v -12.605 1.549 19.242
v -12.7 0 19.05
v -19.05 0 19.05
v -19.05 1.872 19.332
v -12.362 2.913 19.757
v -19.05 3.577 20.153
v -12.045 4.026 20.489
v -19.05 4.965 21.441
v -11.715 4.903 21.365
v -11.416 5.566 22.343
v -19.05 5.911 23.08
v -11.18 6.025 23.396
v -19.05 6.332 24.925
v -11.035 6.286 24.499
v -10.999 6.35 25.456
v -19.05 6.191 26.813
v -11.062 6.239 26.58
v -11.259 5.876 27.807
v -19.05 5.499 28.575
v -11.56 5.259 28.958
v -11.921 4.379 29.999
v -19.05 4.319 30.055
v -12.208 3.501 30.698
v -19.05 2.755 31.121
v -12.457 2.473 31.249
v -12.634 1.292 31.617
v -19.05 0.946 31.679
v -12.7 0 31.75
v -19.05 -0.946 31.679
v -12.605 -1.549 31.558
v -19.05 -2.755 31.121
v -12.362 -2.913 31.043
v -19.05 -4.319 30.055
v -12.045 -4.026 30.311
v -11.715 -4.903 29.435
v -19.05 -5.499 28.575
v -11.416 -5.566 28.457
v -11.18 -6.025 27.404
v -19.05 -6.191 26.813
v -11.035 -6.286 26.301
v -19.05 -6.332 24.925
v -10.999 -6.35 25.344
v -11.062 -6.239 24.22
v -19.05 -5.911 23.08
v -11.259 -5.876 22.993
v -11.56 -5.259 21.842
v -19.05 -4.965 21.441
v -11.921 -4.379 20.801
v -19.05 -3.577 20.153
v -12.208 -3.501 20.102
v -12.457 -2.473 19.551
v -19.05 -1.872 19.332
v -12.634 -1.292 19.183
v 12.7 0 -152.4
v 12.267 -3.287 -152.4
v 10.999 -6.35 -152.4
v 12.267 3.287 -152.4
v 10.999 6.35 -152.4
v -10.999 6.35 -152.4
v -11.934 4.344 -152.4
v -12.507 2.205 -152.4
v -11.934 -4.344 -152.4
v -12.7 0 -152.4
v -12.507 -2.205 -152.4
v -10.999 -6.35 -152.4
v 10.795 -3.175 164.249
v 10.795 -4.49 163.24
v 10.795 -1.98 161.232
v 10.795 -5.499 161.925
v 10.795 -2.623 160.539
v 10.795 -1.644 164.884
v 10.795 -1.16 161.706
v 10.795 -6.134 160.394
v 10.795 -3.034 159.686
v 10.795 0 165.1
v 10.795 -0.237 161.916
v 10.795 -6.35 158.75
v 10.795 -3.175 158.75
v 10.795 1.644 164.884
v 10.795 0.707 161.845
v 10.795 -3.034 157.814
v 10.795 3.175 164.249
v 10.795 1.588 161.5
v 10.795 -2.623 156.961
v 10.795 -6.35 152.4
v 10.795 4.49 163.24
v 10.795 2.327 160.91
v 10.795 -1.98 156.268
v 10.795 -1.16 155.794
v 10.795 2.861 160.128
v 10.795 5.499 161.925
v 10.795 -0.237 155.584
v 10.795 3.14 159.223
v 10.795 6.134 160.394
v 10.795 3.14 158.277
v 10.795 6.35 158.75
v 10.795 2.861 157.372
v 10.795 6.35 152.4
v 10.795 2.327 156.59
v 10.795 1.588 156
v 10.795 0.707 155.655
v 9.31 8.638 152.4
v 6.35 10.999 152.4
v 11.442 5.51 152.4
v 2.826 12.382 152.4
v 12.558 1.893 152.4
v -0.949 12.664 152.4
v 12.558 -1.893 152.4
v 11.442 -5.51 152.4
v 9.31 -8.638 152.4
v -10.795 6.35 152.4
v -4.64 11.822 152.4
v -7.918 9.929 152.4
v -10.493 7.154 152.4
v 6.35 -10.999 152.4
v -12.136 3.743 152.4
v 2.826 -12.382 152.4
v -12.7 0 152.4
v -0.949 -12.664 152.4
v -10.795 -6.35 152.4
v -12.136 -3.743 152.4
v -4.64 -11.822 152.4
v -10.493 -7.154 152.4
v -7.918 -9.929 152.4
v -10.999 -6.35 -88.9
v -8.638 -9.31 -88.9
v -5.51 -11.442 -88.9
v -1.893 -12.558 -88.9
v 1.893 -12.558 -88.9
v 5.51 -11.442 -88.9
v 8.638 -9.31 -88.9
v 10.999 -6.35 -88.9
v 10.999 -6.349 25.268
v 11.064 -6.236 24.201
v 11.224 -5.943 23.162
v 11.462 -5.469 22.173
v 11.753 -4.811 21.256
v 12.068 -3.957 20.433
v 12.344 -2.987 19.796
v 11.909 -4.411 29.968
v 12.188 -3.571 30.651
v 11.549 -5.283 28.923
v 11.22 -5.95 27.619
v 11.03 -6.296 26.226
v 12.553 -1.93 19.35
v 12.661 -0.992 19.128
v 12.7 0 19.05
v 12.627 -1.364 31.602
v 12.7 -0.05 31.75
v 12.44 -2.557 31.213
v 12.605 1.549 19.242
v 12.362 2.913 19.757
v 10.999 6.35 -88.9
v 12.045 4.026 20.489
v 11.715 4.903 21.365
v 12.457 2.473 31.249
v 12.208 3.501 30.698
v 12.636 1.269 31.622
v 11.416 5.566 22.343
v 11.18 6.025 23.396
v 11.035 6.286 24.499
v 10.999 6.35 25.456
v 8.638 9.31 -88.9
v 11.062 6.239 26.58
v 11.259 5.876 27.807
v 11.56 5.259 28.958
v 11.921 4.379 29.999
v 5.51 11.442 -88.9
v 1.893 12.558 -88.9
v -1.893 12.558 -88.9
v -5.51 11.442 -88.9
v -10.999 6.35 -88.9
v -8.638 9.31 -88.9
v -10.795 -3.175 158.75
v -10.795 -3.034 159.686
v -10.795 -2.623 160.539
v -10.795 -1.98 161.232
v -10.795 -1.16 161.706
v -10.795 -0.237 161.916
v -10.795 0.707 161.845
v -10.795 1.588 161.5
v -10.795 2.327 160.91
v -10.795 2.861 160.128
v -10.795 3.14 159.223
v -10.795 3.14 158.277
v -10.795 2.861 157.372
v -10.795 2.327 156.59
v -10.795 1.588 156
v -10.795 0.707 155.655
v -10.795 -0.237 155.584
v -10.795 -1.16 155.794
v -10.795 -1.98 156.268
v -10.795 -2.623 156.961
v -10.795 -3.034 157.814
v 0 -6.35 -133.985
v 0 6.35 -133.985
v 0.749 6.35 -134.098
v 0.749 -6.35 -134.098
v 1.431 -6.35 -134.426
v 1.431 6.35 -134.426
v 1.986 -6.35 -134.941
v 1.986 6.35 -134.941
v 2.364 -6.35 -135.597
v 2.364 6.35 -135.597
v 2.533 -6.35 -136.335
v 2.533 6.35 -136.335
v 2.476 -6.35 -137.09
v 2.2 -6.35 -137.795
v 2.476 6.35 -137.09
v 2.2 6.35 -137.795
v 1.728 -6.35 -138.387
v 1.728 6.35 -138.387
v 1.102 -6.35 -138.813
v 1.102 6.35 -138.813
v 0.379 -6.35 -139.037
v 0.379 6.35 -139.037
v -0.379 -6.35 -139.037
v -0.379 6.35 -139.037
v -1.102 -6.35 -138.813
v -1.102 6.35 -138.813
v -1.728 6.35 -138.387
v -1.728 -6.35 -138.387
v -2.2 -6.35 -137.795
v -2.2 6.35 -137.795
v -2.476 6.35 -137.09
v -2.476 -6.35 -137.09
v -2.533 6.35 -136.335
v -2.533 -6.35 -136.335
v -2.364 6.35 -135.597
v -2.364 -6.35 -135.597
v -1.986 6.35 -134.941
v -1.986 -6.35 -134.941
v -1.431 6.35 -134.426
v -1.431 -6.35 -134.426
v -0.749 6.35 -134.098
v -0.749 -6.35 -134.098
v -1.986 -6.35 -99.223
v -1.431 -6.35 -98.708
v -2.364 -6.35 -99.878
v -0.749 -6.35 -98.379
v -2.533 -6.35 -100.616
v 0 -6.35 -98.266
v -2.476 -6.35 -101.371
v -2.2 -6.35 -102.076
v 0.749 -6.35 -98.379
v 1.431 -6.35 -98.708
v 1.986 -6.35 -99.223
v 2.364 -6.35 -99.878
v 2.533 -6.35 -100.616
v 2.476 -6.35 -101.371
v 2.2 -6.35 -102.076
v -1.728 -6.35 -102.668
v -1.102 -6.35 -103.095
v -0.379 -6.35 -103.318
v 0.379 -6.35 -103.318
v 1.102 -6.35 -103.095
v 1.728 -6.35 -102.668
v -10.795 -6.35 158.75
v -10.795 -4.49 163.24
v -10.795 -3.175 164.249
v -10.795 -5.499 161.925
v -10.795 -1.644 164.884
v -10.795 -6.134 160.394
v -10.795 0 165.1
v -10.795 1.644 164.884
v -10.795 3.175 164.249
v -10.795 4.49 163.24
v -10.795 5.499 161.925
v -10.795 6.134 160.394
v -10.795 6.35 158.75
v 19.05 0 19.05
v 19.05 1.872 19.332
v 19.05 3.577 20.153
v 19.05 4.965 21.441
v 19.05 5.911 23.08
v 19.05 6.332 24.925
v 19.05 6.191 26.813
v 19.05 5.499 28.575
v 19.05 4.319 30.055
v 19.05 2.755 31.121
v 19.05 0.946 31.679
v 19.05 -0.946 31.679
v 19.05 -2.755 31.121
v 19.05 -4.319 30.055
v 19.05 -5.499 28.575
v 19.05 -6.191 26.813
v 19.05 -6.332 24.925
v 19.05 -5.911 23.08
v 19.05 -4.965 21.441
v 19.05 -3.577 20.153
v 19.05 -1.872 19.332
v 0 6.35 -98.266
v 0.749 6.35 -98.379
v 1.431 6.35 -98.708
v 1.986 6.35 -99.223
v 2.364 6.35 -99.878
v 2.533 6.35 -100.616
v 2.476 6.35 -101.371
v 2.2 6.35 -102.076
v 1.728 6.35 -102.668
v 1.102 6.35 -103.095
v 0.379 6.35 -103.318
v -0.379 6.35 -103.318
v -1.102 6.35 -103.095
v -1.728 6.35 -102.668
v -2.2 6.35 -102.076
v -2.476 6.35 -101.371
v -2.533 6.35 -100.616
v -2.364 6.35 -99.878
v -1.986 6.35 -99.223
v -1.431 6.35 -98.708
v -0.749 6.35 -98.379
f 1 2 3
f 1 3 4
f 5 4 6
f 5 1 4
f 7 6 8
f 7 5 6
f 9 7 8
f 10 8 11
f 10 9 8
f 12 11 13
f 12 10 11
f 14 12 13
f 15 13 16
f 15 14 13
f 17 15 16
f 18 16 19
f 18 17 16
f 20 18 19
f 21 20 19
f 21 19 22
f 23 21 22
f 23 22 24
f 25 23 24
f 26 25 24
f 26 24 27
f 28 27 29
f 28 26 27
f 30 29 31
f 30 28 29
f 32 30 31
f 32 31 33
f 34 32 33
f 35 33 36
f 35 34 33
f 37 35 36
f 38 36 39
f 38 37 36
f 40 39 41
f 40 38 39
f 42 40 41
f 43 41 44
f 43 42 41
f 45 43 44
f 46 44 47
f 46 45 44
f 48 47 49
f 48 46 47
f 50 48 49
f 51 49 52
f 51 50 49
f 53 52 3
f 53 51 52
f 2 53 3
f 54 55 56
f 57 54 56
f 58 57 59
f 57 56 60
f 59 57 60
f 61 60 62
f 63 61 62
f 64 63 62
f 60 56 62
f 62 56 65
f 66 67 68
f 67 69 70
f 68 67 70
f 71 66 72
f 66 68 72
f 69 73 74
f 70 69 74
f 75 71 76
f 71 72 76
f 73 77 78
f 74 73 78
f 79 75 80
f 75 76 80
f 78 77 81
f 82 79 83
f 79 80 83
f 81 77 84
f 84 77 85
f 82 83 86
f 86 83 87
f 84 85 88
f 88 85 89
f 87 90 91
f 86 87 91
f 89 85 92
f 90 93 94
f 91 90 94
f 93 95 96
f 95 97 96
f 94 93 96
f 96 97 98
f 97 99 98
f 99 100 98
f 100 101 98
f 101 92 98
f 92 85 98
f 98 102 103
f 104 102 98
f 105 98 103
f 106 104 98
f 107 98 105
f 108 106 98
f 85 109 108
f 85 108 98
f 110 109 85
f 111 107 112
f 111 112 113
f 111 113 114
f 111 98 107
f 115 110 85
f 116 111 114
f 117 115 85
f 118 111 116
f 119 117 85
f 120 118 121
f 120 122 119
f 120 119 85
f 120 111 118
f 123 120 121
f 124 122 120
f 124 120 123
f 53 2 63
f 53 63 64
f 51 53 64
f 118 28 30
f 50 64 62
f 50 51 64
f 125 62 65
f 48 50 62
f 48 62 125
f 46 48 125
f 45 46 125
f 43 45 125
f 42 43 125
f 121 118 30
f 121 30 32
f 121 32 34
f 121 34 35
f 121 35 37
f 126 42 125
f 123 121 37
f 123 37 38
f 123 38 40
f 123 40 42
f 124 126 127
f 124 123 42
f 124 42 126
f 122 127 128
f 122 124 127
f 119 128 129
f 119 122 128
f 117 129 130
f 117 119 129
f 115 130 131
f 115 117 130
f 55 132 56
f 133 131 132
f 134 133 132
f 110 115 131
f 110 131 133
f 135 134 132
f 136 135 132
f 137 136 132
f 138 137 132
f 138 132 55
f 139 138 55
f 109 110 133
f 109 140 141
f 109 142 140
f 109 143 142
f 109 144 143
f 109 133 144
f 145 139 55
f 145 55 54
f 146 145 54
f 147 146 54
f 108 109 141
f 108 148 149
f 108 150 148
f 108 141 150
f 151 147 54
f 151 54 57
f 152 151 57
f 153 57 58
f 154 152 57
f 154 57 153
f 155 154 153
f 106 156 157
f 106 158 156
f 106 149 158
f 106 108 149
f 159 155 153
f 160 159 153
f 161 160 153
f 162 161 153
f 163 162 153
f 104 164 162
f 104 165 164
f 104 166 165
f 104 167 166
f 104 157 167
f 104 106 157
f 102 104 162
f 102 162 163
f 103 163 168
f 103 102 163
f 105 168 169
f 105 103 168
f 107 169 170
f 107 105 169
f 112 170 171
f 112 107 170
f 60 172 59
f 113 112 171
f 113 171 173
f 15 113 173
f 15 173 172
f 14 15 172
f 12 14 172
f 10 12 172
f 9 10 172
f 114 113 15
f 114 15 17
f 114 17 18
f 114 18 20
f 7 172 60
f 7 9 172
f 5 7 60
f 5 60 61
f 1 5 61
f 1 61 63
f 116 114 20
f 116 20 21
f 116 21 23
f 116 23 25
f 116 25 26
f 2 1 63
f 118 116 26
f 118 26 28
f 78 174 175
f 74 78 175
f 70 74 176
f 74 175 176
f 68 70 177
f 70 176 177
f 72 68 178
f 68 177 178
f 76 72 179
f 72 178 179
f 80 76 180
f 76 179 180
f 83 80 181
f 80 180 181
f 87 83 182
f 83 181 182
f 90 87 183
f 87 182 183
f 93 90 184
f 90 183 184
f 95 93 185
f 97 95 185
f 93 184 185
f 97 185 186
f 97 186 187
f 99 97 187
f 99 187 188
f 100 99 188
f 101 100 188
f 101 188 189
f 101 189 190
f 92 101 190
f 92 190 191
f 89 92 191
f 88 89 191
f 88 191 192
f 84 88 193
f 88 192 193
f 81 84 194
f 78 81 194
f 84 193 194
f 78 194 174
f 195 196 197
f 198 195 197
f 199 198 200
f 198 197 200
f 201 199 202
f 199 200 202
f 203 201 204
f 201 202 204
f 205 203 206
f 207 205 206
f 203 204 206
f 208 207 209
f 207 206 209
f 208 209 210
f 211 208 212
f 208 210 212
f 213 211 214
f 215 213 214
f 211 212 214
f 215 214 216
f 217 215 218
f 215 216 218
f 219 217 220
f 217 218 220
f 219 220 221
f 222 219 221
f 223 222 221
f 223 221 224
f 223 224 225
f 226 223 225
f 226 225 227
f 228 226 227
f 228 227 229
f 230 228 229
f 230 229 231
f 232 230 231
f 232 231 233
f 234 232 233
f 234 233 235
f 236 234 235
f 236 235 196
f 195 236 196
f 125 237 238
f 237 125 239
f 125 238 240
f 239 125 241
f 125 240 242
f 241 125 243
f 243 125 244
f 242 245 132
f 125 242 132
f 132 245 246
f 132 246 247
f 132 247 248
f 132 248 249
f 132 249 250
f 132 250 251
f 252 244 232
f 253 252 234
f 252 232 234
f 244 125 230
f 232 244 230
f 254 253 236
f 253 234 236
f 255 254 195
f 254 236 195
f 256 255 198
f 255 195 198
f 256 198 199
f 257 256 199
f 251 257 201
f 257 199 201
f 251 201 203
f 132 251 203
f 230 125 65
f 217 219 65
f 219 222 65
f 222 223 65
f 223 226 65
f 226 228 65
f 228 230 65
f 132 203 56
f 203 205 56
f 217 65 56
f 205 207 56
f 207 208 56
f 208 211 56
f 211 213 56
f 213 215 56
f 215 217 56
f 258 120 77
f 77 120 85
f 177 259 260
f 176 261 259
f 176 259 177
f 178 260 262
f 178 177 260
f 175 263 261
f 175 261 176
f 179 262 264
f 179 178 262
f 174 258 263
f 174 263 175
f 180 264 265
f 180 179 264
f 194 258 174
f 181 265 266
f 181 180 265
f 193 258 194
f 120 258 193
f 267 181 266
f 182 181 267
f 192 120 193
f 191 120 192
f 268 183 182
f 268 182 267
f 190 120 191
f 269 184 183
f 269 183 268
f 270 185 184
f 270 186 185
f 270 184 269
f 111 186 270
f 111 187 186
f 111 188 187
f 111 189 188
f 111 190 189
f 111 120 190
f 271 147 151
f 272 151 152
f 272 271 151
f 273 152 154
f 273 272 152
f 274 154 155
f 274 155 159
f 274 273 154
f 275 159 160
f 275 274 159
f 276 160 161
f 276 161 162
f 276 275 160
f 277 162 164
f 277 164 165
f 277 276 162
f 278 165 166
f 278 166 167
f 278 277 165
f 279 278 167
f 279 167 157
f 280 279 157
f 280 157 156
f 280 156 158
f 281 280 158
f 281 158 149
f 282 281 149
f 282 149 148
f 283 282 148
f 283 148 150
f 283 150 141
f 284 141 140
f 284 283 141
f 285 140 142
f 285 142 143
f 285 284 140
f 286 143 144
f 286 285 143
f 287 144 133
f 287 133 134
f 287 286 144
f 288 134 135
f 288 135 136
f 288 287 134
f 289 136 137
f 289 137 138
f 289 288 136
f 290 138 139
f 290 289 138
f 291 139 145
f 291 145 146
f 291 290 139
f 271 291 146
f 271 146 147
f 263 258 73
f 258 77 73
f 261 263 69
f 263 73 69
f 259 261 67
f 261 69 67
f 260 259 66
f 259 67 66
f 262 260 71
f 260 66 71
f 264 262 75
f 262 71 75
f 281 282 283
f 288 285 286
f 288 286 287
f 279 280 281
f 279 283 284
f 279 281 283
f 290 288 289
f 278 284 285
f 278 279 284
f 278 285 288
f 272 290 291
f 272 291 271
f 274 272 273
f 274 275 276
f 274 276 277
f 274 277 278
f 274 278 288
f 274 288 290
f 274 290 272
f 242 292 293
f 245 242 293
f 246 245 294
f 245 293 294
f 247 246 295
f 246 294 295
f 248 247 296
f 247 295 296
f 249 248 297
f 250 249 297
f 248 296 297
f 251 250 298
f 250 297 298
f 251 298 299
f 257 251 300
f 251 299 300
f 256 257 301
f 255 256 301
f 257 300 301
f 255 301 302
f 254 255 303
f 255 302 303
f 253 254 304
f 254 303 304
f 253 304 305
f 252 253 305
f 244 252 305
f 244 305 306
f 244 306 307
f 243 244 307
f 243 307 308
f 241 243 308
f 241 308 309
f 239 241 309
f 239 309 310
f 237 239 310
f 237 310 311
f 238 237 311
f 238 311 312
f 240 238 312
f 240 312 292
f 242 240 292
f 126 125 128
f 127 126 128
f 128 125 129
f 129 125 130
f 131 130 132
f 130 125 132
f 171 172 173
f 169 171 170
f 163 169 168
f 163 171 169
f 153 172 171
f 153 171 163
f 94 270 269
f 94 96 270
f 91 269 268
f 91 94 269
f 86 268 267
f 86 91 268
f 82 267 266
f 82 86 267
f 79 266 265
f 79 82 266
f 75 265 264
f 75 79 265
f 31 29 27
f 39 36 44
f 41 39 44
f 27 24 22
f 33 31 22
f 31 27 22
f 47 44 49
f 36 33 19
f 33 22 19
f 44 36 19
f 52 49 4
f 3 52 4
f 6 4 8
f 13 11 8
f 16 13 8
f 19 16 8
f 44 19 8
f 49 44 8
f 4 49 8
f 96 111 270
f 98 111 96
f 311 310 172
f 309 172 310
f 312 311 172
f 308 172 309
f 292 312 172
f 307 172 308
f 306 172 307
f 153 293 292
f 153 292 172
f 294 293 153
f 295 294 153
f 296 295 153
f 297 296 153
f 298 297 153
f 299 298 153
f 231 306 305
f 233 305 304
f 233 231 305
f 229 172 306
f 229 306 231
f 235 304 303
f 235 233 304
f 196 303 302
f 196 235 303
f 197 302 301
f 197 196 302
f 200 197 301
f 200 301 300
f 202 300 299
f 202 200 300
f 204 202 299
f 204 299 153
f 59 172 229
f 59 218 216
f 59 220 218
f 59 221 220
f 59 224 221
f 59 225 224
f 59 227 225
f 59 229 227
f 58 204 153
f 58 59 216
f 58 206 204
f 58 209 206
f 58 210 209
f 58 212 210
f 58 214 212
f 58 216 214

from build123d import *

# Parameters (mm, degrees)
SKETCH1_R                = 12.7
BOSS_EXTRUDE3_DEPTH      = 152.4
SKETCH9_R                = 6.35
BOSS_EXTRUDE6_DEPTH      = 19.05
SKETCH16_W               = 25.4
SKETCH16_H               = 63.5
CUT_EXTRUDE2_DEPTH       = 155.762931731
SKETCH17_W               = 25.4
SKETCH17_H               = 63.5
CUT_EXTRUDE3_DEPTH       = 155.762931731
SKETCH19_R               = 2.54
CUT_EXTRUDE5_DEPTH       = 155.762931731
SKETCH21_W               = 21.59
SKETCH21_H               = 12.7
BOSS_EXTRUDE8_DEPTH      = 12.7
BOSS_EXTRUDE9_DEPTH      = 6.35
SKETCH25_R               = 3.175
CUT_EXTRUDE7_DEPTH       = 21.59
SKETCH29_R               = 2.921
BOSS_EXTRUDE10_DEPTH     = 35.814
FILLET2_R                = 6.35
FILLET3_R                = 6.35
SKETCH31_W               = 63.5
SKETCH31_H               = 63.5
BOSS_EXTRUDE11_DEPTH     = 10.16
SKETCH32_W               = 76.52614712
SKETCH32_H               = 17.415789338
CUT_EXTRUDE8_DEPTH       = 195.047688304
SKETCH33_W               = 10.16
SKETCH33_H               = 12.7
CUT_EXTRUDE9_DEPTH       = 168.793532357
CUT_EXTRUDE11_DEPTH      = 169.255829122
CUT_EXTRUDE11_DEPTH_BACK = 169.255829122
SKETCH35_R               = 2.921


with BuildPart() as part:
    # Sketch1 → Boss-Extrude3 (new, symmetric)
    with BuildSketch(Plane.XY):
        with Locations(Location((0, 0, 0), (0, 0, 180))):
            Circle(SKETCH1_R)
    extrude(amount=BOSS_EXTRUDE3_DEPTH, both=True)

    # Sketch9 → Boss-Extrude6 (add, symmetric)
    with BuildSketch(Plane(origin=(0, 0, 0), x_dir=(0, 0, -1), z_dir=(1, 0, 0))):
        with Locations((-25.4, 0)):
            Circle(SKETCH9_R)
    extrude(amount=BOSS_EXTRUDE6_DEPTH, both=True)

    # Sketch16 → Cut-Extrude2 (cut, through all)
    with BuildSketch(Plane(origin=(0, -6.35, 0), x_dir=(1, 0, 0), z_dir=(0, 1, 0))):
        with Locations((0, 120.65)):
            Rectangle(SKETCH16_W, SKETCH16_H)
    extrude(amount=-CUT_EXTRUDE2_DEPTH, mode=Mode.SUBTRACT)

    # Sketch17 → Cut-Extrude3 (cut, through all)
    with BuildSketch(Plane(origin=(0, 6.35, 0), x_dir=(1, 0, 0), z_dir=(0, 1, 0))):
        with Locations((0, 120.65)):
            Rectangle(SKETCH17_W, SKETCH17_H)
    extrude(amount=CUT_EXTRUDE3_DEPTH, mode=Mode.SUBTRACT)

    # Sketch19 → Cut-Extrude5 (cut, through all)
    with BuildSketch(Plane(origin=(0, 6.35, 0), x_dir=(1, 0, 0), z_dir=(0, 1, 0))):
        with Locations(Location((0, 100.80625, 0), (0, 0, 270))):
            Circle(SKETCH19_R)
        with Locations(Location((0, 136.525, 0), (0, 0, 270))):
            Circle(SKETCH19_R)
    extrude(amount=-CUT_EXTRUDE5_DEPTH, mode=Mode.SUBTRACT)

    # Sketch21 → Boss-Extrude8 (add)
    with BuildSketch(Plane.XY.offset(152.4)):
        Rectangle(SKETCH21_W, SKETCH21_H)
    extrude(amount=BOSS_EXTRUDE8_DEPTH)

    # Sketch25 → Cut-Extrude7 (cut)
    with BuildSketch(Plane.ZY.offset(10.795)):
        with Locations(Location((158.75, 0, 0), (0, 0, 270))):
            Circle(SKETCH25_R)
    extrude(amount=-CUT_EXTRUDE7_DEPTH, mode=Mode.SUBTRACT)

    # Fillet3
    fillet3_edges = [part.edges().sort_by_distance(p)[0] for p in [
        (0, -6.35, 165.1),
        (0, 6.35, 165.1),
    ]]
    fillet(fillet3_edges, radius=FILLET3_R - 0.0001)  # a hair under: the kernel refuses the full size


with BuildPart() as body_2:
    # Sketch27 → Boss-Extrude9 (new, symmetric)
    with BuildSketch(Plane(origin=(0, 0, 0), x_dir=(1, 0, 0), z_dir=(0, 1, 0))):
        Polygon((0, -165.354), (11.049, -165.354), (11.049, -152.654), (21.209, -152.654), (21.209, -170.434), (-21.209, -170.434), (-21.209, -152.654), (-11.049, -152.654), (-11.049, -165.354), align=None)
    extrude(amount=BOSS_EXTRUDE9_DEPTH, both=True)

    # Sketch29 → Boss-Extrude10 (add)
    with BuildSketch(Plane.ZY.offset(21.209)):
        with Locations((158.827896988, 0)):
            Circle(SKETCH29_R)
    extrude(amount=-BOSS_EXTRUDE10_DEPTH)

    # Fillet2
    fillet2_edges = [body_2.edges().sort_by_distance(p)[0] for p in [
        (16.129, -6.35, 152.654),
        (16.129, 6.35, 152.654),
        (-16.129, -6.35, 152.654),
        (-16.129, 6.35, 152.654),
    ]]
    fillet(fillet2_edges, radius=FILLET2_R - 0.0001)  # a hair under: the kernel refuses the full size

    # Sketch31 → Boss-Extrude11 (add)
    with BuildSketch(Plane.XY.offset(170.434)):
        Rectangle(SKETCH31_W, SKETCH31_H)
    extrude(amount=BOSS_EXTRUDE11_DEPTH)

    # Sketch32 → Cut-Extrude8 (cut, through all)
    with BuildSketch(Plane(origin=(0, 31.75, 0), x_dir=(1, 0, 0), z_dir=(0, 1, 0))):
        with Locations((-0.932221908, -174.061894669)):
            Rectangle(SKETCH32_W, SKETCH32_H)
    extrude(amount=-CUT_EXTRUDE8_DEPTH, mode=Mode.SUBTRACT)

    # Sketch33 → Cut-Extrude9 (cut, through all)
    with BuildSketch(Plane(origin=(0, 6.35, 0), x_dir=(1, 0, 0), z_dir=(0, 1, 0))):
        with Locations((-16.129, -159.004)):
            Rectangle(SKETCH33_W, SKETCH33_H)
        with Locations((16.129, -159.004)):
            Rectangle(SKETCH33_W, SKETCH33_H)
    extrude(amount=-CUT_EXTRUDE9_DEPTH, mode=Mode.SUBTRACT)

    # Sketch35 → Cut-Extrude11 (cut, two sides: drawn at the far end of the back side and taken through both)
    with BuildSketch(Plane.ZY.offset(10.795).offset(-CUT_EXTRUDE11_DEPTH_BACK)):
        with Locations((158.827896988, 0)):
            Circle(SKETCH35_R)
    extrude(amount=CUT_EXTRUDE11_DEPTH + CUT_EXTRUDE11_DEPTH_BACK, mode=Mode.SUBTRACT)


solid = part.part
